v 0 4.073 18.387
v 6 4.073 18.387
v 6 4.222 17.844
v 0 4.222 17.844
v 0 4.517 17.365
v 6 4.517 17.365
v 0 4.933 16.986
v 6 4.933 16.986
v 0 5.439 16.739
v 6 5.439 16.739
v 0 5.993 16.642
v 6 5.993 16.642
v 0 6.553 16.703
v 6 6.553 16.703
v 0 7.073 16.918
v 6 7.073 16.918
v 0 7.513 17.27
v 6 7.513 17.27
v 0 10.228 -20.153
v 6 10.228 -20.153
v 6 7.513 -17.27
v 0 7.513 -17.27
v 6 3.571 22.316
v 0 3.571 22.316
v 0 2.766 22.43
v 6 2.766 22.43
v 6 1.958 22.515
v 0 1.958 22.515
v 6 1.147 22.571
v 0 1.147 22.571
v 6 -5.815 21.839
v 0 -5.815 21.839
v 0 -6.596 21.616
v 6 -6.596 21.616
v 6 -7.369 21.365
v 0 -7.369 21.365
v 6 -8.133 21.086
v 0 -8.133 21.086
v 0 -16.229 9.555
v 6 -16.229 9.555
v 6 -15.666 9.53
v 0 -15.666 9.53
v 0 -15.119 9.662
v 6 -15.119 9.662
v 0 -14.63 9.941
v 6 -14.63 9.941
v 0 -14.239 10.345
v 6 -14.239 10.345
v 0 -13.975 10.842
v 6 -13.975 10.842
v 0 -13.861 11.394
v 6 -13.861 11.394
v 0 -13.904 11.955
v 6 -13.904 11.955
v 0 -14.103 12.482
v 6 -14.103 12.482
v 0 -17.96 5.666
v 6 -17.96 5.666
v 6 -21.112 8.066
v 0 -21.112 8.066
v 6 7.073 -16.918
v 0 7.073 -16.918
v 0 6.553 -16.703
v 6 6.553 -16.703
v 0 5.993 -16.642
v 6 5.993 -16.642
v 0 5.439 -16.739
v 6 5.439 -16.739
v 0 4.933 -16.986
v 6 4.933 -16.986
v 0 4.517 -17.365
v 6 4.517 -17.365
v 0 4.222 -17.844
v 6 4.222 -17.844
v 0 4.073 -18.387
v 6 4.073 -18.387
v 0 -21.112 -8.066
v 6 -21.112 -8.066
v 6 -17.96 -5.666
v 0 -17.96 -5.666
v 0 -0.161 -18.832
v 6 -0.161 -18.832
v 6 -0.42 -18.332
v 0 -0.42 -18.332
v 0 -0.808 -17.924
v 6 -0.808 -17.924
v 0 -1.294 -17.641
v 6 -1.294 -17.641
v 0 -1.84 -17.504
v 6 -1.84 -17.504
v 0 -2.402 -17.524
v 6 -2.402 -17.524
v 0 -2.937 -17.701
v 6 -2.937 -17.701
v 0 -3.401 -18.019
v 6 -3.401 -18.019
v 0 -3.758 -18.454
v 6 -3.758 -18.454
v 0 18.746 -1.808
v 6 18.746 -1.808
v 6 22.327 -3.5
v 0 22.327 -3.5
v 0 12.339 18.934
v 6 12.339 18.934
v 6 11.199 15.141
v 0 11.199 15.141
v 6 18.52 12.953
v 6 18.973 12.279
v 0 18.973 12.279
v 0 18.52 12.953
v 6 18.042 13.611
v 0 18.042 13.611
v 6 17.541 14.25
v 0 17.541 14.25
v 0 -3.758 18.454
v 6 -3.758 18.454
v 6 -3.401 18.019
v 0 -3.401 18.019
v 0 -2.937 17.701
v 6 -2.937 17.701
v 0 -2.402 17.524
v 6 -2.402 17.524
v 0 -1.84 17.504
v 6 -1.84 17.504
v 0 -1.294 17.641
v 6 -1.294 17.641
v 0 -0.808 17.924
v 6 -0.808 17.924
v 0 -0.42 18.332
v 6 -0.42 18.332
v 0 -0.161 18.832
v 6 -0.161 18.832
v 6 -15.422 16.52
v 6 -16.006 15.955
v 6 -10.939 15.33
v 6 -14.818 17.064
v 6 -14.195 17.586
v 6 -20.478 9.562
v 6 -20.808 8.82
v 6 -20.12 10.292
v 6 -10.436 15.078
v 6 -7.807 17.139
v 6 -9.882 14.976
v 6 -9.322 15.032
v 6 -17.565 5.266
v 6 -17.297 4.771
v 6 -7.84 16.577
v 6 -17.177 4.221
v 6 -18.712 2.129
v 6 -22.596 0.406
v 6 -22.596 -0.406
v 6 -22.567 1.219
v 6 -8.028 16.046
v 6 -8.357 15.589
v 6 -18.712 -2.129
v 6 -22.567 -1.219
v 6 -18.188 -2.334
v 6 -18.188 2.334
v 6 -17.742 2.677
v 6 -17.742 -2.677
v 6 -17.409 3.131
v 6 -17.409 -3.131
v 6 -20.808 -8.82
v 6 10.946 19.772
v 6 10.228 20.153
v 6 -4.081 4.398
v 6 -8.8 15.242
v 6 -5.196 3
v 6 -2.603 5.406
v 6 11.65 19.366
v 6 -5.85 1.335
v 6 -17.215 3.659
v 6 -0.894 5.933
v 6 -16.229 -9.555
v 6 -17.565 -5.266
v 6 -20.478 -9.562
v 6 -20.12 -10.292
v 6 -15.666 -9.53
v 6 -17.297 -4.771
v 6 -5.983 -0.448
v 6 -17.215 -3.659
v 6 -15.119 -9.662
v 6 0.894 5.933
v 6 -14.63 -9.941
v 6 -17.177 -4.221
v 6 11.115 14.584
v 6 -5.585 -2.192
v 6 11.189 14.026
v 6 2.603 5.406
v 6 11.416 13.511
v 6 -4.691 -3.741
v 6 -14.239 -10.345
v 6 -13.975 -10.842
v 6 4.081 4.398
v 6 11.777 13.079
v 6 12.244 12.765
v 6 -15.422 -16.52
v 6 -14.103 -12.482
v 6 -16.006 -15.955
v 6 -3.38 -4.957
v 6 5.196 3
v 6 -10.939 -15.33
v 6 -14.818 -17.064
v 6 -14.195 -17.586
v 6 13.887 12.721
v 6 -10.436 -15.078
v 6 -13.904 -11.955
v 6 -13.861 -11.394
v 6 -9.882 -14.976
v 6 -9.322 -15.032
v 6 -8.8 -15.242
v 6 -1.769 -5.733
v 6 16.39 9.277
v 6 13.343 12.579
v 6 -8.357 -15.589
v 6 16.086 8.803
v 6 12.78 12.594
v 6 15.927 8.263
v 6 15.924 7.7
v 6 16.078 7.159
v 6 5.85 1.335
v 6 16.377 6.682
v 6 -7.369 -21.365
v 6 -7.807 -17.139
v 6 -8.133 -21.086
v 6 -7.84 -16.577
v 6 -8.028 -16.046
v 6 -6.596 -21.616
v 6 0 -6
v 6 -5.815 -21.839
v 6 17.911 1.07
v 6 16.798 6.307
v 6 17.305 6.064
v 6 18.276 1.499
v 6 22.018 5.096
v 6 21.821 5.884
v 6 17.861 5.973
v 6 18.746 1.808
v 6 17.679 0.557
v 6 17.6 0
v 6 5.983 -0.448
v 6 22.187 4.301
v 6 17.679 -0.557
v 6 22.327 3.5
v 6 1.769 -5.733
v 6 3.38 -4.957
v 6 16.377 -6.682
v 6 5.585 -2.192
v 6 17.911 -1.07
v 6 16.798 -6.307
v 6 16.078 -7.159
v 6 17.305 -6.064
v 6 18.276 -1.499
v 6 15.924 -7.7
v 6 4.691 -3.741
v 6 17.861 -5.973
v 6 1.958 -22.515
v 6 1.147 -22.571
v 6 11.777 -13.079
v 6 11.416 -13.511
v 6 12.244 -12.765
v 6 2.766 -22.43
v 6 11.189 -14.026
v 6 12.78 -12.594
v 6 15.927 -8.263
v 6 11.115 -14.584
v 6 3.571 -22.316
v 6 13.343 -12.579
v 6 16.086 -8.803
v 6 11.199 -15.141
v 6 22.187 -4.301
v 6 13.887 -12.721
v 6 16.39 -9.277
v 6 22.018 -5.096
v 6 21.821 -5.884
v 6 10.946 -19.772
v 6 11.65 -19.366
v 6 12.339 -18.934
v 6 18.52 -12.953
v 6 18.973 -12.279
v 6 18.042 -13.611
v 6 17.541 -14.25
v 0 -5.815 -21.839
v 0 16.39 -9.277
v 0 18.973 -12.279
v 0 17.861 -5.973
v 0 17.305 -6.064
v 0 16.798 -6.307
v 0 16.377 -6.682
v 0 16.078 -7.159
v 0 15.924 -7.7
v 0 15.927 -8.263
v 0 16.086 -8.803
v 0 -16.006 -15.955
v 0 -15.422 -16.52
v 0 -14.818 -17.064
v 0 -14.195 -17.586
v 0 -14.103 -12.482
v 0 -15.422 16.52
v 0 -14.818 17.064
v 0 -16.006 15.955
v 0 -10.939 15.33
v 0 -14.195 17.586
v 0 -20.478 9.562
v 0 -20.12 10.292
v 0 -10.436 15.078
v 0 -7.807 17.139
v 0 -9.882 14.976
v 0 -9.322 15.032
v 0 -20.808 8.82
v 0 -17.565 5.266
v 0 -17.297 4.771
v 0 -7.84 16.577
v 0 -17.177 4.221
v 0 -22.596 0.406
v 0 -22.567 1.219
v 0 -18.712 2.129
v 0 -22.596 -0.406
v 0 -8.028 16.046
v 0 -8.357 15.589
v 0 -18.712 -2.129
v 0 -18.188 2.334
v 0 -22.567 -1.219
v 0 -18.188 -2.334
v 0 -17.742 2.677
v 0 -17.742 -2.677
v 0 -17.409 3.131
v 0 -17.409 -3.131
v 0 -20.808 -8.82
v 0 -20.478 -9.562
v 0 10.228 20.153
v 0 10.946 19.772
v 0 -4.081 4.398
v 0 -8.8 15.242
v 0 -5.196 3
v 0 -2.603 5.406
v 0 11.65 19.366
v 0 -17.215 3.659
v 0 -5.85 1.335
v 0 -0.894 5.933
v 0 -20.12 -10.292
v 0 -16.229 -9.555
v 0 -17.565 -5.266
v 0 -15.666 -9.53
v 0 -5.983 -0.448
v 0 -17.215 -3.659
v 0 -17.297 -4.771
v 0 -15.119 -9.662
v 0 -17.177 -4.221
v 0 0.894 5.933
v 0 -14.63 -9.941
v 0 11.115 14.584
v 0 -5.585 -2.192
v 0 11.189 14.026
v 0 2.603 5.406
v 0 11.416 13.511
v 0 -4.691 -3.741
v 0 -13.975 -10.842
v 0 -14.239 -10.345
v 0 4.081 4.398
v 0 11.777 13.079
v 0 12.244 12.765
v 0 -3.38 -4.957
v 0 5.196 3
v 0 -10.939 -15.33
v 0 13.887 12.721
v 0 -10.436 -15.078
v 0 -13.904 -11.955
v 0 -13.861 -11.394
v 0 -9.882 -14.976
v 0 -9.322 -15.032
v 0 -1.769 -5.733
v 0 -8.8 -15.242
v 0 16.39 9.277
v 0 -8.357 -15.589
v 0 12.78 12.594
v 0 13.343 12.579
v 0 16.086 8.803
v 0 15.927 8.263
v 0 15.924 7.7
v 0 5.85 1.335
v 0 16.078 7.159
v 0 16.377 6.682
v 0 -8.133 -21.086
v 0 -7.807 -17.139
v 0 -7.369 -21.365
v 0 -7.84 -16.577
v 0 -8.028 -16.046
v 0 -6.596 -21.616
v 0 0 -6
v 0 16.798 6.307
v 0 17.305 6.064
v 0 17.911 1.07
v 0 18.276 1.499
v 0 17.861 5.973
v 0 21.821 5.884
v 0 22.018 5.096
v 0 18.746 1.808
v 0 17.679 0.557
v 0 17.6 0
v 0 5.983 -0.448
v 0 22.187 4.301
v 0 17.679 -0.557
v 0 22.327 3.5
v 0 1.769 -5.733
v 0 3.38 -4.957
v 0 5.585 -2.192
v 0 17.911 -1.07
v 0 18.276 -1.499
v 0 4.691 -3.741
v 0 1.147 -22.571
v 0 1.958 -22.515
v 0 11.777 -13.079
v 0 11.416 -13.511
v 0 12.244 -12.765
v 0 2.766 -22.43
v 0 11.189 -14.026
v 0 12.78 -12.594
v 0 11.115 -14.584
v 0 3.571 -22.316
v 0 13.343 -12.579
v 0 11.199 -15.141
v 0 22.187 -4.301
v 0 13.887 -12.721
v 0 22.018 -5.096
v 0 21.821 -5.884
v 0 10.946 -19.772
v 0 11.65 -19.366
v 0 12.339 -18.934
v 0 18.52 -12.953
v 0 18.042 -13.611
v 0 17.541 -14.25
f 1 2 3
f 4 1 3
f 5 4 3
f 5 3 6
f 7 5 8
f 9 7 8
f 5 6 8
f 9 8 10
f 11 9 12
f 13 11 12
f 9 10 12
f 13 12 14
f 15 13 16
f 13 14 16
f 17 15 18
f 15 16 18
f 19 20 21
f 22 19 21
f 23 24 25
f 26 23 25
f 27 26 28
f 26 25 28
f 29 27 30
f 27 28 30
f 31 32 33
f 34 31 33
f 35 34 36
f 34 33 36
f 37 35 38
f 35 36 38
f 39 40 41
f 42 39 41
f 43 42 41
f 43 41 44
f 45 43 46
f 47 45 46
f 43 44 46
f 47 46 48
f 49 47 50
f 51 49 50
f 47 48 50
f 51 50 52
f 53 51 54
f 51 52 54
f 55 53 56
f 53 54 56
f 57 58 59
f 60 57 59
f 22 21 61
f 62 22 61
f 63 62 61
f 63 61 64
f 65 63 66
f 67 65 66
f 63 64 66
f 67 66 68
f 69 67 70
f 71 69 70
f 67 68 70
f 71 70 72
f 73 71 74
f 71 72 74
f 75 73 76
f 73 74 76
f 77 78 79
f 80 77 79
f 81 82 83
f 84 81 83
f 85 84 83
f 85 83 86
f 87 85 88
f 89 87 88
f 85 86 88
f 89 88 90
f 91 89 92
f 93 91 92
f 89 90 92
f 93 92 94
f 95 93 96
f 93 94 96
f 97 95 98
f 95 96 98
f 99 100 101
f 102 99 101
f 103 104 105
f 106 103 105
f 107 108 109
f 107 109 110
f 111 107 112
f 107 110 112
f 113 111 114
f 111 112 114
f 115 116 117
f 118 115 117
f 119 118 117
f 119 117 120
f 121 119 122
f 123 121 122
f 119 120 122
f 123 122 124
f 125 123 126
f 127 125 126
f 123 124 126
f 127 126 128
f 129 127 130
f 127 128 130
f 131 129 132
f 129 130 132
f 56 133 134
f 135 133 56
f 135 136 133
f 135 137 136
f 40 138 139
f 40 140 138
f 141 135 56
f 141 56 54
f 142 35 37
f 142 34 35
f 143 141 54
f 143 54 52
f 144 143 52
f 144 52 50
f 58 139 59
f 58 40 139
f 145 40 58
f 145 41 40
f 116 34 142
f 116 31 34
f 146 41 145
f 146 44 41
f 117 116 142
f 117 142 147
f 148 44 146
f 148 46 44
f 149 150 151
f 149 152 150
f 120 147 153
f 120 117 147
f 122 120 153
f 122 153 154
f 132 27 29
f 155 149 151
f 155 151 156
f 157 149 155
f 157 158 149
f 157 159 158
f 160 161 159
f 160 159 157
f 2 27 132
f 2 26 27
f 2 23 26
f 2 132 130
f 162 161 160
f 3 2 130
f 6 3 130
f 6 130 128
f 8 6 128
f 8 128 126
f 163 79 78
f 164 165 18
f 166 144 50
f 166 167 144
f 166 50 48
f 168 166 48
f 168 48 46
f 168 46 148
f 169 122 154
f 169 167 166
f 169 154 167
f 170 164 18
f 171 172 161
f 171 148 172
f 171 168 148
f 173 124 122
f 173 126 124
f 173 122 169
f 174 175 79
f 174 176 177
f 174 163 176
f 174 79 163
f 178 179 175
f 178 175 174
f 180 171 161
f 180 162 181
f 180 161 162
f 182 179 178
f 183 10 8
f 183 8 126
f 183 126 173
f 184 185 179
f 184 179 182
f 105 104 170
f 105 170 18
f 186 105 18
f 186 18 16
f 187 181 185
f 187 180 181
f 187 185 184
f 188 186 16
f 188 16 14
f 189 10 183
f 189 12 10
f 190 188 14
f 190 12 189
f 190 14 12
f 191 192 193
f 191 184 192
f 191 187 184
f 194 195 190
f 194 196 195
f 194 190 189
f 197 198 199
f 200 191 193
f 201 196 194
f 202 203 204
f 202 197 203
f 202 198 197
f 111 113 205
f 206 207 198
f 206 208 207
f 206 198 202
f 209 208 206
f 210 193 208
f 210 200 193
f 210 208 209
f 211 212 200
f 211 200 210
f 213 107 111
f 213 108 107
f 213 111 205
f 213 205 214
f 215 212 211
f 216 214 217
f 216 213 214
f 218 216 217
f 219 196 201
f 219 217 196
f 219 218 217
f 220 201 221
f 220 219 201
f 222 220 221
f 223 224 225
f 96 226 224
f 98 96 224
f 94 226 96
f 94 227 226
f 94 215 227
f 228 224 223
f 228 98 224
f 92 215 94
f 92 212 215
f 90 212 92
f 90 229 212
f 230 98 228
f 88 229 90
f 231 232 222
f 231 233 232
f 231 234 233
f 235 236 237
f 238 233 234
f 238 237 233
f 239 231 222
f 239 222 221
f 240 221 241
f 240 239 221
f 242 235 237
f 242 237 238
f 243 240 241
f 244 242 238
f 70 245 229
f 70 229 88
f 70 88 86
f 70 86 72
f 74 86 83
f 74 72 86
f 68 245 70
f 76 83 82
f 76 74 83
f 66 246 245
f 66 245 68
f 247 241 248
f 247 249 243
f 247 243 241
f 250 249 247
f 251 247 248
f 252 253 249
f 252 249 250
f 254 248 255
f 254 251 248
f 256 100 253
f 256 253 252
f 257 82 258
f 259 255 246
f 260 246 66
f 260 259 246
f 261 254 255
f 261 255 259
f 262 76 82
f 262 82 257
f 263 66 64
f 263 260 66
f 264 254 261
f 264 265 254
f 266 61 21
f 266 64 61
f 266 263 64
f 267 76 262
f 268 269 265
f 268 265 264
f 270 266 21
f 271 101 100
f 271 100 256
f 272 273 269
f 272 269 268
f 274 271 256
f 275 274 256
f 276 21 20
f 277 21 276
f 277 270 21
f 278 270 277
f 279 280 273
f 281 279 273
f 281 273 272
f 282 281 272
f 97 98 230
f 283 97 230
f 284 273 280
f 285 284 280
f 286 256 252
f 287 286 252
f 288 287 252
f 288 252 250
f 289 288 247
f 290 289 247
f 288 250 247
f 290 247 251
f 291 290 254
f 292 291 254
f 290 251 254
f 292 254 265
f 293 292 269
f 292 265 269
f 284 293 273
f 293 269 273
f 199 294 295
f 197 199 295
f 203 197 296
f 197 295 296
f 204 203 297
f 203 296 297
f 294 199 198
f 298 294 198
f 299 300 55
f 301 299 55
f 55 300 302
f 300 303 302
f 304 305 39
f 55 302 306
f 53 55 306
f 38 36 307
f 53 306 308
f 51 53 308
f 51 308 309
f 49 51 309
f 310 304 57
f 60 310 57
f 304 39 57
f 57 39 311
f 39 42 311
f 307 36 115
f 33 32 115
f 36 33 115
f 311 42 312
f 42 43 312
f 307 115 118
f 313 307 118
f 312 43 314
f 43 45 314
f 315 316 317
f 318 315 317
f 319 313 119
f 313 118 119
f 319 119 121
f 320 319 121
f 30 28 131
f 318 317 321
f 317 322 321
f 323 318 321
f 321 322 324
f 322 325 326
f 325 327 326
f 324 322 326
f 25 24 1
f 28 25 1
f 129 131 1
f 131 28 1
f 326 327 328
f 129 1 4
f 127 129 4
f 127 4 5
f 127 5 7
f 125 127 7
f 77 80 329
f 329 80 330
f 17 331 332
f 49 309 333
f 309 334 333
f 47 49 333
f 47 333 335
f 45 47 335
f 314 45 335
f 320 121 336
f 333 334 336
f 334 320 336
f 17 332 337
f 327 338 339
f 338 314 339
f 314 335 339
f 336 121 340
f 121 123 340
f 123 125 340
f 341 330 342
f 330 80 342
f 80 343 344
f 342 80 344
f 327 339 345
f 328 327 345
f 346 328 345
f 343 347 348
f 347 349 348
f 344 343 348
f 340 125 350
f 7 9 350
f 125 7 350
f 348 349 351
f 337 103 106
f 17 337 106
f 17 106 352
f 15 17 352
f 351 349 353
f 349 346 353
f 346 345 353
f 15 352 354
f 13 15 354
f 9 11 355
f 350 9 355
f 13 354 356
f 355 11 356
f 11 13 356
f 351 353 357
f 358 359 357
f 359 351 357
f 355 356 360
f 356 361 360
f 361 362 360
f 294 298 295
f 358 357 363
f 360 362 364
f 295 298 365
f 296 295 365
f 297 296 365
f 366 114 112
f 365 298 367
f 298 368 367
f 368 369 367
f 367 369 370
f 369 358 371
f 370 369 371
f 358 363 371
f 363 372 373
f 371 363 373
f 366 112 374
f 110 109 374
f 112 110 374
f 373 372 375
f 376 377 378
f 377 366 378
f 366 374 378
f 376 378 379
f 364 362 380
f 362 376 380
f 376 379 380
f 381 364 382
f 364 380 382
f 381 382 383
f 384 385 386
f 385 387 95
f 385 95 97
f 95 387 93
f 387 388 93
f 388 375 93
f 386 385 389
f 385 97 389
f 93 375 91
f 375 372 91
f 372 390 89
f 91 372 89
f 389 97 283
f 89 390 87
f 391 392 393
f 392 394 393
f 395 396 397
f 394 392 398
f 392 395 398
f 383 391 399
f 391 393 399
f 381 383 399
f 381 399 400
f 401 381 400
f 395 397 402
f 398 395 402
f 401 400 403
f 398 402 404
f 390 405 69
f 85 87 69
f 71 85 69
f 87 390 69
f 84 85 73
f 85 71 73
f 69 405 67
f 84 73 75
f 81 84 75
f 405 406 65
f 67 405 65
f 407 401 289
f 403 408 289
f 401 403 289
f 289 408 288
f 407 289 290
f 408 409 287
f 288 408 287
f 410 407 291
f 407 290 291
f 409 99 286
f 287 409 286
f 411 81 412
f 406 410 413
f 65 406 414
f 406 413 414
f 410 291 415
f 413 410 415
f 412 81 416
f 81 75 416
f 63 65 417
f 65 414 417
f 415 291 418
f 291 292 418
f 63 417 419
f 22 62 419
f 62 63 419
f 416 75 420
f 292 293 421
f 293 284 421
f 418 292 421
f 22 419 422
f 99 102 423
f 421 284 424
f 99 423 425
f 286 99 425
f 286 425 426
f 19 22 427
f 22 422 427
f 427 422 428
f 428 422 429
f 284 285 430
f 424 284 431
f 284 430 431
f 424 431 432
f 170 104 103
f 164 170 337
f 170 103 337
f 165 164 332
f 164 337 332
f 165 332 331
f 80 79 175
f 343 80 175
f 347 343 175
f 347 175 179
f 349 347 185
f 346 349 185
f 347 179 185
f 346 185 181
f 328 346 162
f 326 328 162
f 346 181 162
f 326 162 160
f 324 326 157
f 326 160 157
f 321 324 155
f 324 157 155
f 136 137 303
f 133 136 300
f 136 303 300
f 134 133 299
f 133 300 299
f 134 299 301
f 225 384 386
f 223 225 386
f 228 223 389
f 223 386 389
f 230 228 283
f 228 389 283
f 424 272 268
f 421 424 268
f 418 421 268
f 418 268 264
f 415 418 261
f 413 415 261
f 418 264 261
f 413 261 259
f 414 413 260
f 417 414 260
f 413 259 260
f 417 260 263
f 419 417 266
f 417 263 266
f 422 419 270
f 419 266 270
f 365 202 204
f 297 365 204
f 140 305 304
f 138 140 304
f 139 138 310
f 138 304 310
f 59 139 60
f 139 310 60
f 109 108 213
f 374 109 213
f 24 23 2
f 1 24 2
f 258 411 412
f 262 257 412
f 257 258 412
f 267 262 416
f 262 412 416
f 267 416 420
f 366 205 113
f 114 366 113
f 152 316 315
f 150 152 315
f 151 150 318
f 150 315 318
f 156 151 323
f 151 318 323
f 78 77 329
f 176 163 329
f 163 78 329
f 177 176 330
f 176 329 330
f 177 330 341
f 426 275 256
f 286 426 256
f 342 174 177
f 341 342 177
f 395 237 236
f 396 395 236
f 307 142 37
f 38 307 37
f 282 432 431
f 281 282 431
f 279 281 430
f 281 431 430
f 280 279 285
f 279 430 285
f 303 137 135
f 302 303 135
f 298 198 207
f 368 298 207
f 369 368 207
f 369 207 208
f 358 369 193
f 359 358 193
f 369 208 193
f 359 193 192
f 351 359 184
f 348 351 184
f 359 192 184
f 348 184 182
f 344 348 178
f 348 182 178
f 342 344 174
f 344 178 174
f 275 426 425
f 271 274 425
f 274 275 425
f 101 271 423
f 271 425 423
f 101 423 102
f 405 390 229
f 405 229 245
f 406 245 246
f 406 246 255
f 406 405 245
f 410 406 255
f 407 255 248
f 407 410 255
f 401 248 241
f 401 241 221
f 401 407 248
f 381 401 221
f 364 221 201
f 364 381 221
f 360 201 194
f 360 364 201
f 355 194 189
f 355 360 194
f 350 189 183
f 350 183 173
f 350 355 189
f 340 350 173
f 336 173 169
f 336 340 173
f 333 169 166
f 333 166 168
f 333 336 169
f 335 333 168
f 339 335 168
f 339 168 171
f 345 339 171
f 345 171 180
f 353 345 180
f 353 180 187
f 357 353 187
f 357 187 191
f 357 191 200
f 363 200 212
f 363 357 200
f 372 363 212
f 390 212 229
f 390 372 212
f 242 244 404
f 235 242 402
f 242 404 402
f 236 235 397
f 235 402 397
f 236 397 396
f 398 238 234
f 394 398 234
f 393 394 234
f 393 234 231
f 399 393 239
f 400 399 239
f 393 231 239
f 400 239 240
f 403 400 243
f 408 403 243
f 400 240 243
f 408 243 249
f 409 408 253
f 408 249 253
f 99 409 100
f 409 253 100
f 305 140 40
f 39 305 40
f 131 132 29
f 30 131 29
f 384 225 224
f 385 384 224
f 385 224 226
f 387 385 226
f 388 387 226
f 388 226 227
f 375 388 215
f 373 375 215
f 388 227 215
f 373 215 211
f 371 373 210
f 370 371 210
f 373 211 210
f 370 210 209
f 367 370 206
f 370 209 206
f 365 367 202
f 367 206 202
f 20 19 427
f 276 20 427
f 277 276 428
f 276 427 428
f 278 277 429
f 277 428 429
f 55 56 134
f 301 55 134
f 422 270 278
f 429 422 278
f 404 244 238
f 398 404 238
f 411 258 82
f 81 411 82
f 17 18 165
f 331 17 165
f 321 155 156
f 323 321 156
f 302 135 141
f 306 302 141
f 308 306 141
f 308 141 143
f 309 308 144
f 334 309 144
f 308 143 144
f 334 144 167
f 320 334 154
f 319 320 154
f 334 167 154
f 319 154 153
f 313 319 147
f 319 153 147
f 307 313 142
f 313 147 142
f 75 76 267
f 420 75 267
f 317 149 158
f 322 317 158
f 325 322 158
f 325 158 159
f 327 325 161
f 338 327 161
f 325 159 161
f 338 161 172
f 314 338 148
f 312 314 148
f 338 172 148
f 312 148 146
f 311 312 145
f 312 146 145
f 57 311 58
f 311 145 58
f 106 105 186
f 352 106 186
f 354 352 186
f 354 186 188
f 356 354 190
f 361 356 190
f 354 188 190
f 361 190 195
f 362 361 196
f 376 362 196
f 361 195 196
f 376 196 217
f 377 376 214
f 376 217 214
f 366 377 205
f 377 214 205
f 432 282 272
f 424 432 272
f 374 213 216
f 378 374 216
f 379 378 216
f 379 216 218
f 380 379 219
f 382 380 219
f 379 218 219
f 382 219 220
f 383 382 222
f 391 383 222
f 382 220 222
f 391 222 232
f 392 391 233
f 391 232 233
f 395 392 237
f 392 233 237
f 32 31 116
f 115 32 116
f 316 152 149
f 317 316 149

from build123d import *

# Parameters (mm, degrees)
SKETCH1_R           = 22.6
SKETCH1_R_2         = 6
BOSS_EXTRUDE1_DEPTH = 6
CUT_EXTRUDE1_DEPTH  = 6
CIRPATTERN1_COUNT   = 15


with BuildPart() as part:
    # Sketch1 → Boss-Extrude1 (new body)
    with BuildSketch(Plane(origin=(0, 0, 0), x_dir=(0, 0, -1), z_dir=(1, 0, 0))):
        Circle(SKETCH1_R)
        Circle(SKETCH1_R_2, mode=Mode.SUBTRACT)
    extrude(amount=BOSS_EXTRUDE1_DEPTH)

    # Sketch2 → Cut-Extrude1 (cut)
    with BuildSketch(Plane(origin=(6, 0, 0), x_dir=(0, 0, -1), z_dir=(1, 0, 0))):
        with BuildLine():
            Line((-3.5, 22.327337504), (-1.808436926, 18.745859565))
            ThreePointArc((-1.808436926, 18.745859565), (0, 17.6), (1.808436926, 18.745859565))
            Line((1.808436926, 18.745859565), (3.5, 22.327337504))
            Line((3.5, 22.327337504), (0, 25.827337504))
            Line((0, 25.827337504), (-3.5, 22.327337504))
        make_face()
    cut_extrude1 = extrude(amount=-CUT_EXTRUDE1_DEPTH, mode=Mode.SUBTRACT)

    # CirPattern1: Cut-Extrude1 ×15 about axis
    cirpattern1_axis = Axis((0, 0, 0), (1, 0, 0))
    for i in range(1, CIRPATTERN1_COUNT):
        add(cut_extrude1.rotate(cirpattern1_axis, i * 360 / CIRPATTERN1_COUNT), mode=Mode.SUBTRACT)


solid = part.part
